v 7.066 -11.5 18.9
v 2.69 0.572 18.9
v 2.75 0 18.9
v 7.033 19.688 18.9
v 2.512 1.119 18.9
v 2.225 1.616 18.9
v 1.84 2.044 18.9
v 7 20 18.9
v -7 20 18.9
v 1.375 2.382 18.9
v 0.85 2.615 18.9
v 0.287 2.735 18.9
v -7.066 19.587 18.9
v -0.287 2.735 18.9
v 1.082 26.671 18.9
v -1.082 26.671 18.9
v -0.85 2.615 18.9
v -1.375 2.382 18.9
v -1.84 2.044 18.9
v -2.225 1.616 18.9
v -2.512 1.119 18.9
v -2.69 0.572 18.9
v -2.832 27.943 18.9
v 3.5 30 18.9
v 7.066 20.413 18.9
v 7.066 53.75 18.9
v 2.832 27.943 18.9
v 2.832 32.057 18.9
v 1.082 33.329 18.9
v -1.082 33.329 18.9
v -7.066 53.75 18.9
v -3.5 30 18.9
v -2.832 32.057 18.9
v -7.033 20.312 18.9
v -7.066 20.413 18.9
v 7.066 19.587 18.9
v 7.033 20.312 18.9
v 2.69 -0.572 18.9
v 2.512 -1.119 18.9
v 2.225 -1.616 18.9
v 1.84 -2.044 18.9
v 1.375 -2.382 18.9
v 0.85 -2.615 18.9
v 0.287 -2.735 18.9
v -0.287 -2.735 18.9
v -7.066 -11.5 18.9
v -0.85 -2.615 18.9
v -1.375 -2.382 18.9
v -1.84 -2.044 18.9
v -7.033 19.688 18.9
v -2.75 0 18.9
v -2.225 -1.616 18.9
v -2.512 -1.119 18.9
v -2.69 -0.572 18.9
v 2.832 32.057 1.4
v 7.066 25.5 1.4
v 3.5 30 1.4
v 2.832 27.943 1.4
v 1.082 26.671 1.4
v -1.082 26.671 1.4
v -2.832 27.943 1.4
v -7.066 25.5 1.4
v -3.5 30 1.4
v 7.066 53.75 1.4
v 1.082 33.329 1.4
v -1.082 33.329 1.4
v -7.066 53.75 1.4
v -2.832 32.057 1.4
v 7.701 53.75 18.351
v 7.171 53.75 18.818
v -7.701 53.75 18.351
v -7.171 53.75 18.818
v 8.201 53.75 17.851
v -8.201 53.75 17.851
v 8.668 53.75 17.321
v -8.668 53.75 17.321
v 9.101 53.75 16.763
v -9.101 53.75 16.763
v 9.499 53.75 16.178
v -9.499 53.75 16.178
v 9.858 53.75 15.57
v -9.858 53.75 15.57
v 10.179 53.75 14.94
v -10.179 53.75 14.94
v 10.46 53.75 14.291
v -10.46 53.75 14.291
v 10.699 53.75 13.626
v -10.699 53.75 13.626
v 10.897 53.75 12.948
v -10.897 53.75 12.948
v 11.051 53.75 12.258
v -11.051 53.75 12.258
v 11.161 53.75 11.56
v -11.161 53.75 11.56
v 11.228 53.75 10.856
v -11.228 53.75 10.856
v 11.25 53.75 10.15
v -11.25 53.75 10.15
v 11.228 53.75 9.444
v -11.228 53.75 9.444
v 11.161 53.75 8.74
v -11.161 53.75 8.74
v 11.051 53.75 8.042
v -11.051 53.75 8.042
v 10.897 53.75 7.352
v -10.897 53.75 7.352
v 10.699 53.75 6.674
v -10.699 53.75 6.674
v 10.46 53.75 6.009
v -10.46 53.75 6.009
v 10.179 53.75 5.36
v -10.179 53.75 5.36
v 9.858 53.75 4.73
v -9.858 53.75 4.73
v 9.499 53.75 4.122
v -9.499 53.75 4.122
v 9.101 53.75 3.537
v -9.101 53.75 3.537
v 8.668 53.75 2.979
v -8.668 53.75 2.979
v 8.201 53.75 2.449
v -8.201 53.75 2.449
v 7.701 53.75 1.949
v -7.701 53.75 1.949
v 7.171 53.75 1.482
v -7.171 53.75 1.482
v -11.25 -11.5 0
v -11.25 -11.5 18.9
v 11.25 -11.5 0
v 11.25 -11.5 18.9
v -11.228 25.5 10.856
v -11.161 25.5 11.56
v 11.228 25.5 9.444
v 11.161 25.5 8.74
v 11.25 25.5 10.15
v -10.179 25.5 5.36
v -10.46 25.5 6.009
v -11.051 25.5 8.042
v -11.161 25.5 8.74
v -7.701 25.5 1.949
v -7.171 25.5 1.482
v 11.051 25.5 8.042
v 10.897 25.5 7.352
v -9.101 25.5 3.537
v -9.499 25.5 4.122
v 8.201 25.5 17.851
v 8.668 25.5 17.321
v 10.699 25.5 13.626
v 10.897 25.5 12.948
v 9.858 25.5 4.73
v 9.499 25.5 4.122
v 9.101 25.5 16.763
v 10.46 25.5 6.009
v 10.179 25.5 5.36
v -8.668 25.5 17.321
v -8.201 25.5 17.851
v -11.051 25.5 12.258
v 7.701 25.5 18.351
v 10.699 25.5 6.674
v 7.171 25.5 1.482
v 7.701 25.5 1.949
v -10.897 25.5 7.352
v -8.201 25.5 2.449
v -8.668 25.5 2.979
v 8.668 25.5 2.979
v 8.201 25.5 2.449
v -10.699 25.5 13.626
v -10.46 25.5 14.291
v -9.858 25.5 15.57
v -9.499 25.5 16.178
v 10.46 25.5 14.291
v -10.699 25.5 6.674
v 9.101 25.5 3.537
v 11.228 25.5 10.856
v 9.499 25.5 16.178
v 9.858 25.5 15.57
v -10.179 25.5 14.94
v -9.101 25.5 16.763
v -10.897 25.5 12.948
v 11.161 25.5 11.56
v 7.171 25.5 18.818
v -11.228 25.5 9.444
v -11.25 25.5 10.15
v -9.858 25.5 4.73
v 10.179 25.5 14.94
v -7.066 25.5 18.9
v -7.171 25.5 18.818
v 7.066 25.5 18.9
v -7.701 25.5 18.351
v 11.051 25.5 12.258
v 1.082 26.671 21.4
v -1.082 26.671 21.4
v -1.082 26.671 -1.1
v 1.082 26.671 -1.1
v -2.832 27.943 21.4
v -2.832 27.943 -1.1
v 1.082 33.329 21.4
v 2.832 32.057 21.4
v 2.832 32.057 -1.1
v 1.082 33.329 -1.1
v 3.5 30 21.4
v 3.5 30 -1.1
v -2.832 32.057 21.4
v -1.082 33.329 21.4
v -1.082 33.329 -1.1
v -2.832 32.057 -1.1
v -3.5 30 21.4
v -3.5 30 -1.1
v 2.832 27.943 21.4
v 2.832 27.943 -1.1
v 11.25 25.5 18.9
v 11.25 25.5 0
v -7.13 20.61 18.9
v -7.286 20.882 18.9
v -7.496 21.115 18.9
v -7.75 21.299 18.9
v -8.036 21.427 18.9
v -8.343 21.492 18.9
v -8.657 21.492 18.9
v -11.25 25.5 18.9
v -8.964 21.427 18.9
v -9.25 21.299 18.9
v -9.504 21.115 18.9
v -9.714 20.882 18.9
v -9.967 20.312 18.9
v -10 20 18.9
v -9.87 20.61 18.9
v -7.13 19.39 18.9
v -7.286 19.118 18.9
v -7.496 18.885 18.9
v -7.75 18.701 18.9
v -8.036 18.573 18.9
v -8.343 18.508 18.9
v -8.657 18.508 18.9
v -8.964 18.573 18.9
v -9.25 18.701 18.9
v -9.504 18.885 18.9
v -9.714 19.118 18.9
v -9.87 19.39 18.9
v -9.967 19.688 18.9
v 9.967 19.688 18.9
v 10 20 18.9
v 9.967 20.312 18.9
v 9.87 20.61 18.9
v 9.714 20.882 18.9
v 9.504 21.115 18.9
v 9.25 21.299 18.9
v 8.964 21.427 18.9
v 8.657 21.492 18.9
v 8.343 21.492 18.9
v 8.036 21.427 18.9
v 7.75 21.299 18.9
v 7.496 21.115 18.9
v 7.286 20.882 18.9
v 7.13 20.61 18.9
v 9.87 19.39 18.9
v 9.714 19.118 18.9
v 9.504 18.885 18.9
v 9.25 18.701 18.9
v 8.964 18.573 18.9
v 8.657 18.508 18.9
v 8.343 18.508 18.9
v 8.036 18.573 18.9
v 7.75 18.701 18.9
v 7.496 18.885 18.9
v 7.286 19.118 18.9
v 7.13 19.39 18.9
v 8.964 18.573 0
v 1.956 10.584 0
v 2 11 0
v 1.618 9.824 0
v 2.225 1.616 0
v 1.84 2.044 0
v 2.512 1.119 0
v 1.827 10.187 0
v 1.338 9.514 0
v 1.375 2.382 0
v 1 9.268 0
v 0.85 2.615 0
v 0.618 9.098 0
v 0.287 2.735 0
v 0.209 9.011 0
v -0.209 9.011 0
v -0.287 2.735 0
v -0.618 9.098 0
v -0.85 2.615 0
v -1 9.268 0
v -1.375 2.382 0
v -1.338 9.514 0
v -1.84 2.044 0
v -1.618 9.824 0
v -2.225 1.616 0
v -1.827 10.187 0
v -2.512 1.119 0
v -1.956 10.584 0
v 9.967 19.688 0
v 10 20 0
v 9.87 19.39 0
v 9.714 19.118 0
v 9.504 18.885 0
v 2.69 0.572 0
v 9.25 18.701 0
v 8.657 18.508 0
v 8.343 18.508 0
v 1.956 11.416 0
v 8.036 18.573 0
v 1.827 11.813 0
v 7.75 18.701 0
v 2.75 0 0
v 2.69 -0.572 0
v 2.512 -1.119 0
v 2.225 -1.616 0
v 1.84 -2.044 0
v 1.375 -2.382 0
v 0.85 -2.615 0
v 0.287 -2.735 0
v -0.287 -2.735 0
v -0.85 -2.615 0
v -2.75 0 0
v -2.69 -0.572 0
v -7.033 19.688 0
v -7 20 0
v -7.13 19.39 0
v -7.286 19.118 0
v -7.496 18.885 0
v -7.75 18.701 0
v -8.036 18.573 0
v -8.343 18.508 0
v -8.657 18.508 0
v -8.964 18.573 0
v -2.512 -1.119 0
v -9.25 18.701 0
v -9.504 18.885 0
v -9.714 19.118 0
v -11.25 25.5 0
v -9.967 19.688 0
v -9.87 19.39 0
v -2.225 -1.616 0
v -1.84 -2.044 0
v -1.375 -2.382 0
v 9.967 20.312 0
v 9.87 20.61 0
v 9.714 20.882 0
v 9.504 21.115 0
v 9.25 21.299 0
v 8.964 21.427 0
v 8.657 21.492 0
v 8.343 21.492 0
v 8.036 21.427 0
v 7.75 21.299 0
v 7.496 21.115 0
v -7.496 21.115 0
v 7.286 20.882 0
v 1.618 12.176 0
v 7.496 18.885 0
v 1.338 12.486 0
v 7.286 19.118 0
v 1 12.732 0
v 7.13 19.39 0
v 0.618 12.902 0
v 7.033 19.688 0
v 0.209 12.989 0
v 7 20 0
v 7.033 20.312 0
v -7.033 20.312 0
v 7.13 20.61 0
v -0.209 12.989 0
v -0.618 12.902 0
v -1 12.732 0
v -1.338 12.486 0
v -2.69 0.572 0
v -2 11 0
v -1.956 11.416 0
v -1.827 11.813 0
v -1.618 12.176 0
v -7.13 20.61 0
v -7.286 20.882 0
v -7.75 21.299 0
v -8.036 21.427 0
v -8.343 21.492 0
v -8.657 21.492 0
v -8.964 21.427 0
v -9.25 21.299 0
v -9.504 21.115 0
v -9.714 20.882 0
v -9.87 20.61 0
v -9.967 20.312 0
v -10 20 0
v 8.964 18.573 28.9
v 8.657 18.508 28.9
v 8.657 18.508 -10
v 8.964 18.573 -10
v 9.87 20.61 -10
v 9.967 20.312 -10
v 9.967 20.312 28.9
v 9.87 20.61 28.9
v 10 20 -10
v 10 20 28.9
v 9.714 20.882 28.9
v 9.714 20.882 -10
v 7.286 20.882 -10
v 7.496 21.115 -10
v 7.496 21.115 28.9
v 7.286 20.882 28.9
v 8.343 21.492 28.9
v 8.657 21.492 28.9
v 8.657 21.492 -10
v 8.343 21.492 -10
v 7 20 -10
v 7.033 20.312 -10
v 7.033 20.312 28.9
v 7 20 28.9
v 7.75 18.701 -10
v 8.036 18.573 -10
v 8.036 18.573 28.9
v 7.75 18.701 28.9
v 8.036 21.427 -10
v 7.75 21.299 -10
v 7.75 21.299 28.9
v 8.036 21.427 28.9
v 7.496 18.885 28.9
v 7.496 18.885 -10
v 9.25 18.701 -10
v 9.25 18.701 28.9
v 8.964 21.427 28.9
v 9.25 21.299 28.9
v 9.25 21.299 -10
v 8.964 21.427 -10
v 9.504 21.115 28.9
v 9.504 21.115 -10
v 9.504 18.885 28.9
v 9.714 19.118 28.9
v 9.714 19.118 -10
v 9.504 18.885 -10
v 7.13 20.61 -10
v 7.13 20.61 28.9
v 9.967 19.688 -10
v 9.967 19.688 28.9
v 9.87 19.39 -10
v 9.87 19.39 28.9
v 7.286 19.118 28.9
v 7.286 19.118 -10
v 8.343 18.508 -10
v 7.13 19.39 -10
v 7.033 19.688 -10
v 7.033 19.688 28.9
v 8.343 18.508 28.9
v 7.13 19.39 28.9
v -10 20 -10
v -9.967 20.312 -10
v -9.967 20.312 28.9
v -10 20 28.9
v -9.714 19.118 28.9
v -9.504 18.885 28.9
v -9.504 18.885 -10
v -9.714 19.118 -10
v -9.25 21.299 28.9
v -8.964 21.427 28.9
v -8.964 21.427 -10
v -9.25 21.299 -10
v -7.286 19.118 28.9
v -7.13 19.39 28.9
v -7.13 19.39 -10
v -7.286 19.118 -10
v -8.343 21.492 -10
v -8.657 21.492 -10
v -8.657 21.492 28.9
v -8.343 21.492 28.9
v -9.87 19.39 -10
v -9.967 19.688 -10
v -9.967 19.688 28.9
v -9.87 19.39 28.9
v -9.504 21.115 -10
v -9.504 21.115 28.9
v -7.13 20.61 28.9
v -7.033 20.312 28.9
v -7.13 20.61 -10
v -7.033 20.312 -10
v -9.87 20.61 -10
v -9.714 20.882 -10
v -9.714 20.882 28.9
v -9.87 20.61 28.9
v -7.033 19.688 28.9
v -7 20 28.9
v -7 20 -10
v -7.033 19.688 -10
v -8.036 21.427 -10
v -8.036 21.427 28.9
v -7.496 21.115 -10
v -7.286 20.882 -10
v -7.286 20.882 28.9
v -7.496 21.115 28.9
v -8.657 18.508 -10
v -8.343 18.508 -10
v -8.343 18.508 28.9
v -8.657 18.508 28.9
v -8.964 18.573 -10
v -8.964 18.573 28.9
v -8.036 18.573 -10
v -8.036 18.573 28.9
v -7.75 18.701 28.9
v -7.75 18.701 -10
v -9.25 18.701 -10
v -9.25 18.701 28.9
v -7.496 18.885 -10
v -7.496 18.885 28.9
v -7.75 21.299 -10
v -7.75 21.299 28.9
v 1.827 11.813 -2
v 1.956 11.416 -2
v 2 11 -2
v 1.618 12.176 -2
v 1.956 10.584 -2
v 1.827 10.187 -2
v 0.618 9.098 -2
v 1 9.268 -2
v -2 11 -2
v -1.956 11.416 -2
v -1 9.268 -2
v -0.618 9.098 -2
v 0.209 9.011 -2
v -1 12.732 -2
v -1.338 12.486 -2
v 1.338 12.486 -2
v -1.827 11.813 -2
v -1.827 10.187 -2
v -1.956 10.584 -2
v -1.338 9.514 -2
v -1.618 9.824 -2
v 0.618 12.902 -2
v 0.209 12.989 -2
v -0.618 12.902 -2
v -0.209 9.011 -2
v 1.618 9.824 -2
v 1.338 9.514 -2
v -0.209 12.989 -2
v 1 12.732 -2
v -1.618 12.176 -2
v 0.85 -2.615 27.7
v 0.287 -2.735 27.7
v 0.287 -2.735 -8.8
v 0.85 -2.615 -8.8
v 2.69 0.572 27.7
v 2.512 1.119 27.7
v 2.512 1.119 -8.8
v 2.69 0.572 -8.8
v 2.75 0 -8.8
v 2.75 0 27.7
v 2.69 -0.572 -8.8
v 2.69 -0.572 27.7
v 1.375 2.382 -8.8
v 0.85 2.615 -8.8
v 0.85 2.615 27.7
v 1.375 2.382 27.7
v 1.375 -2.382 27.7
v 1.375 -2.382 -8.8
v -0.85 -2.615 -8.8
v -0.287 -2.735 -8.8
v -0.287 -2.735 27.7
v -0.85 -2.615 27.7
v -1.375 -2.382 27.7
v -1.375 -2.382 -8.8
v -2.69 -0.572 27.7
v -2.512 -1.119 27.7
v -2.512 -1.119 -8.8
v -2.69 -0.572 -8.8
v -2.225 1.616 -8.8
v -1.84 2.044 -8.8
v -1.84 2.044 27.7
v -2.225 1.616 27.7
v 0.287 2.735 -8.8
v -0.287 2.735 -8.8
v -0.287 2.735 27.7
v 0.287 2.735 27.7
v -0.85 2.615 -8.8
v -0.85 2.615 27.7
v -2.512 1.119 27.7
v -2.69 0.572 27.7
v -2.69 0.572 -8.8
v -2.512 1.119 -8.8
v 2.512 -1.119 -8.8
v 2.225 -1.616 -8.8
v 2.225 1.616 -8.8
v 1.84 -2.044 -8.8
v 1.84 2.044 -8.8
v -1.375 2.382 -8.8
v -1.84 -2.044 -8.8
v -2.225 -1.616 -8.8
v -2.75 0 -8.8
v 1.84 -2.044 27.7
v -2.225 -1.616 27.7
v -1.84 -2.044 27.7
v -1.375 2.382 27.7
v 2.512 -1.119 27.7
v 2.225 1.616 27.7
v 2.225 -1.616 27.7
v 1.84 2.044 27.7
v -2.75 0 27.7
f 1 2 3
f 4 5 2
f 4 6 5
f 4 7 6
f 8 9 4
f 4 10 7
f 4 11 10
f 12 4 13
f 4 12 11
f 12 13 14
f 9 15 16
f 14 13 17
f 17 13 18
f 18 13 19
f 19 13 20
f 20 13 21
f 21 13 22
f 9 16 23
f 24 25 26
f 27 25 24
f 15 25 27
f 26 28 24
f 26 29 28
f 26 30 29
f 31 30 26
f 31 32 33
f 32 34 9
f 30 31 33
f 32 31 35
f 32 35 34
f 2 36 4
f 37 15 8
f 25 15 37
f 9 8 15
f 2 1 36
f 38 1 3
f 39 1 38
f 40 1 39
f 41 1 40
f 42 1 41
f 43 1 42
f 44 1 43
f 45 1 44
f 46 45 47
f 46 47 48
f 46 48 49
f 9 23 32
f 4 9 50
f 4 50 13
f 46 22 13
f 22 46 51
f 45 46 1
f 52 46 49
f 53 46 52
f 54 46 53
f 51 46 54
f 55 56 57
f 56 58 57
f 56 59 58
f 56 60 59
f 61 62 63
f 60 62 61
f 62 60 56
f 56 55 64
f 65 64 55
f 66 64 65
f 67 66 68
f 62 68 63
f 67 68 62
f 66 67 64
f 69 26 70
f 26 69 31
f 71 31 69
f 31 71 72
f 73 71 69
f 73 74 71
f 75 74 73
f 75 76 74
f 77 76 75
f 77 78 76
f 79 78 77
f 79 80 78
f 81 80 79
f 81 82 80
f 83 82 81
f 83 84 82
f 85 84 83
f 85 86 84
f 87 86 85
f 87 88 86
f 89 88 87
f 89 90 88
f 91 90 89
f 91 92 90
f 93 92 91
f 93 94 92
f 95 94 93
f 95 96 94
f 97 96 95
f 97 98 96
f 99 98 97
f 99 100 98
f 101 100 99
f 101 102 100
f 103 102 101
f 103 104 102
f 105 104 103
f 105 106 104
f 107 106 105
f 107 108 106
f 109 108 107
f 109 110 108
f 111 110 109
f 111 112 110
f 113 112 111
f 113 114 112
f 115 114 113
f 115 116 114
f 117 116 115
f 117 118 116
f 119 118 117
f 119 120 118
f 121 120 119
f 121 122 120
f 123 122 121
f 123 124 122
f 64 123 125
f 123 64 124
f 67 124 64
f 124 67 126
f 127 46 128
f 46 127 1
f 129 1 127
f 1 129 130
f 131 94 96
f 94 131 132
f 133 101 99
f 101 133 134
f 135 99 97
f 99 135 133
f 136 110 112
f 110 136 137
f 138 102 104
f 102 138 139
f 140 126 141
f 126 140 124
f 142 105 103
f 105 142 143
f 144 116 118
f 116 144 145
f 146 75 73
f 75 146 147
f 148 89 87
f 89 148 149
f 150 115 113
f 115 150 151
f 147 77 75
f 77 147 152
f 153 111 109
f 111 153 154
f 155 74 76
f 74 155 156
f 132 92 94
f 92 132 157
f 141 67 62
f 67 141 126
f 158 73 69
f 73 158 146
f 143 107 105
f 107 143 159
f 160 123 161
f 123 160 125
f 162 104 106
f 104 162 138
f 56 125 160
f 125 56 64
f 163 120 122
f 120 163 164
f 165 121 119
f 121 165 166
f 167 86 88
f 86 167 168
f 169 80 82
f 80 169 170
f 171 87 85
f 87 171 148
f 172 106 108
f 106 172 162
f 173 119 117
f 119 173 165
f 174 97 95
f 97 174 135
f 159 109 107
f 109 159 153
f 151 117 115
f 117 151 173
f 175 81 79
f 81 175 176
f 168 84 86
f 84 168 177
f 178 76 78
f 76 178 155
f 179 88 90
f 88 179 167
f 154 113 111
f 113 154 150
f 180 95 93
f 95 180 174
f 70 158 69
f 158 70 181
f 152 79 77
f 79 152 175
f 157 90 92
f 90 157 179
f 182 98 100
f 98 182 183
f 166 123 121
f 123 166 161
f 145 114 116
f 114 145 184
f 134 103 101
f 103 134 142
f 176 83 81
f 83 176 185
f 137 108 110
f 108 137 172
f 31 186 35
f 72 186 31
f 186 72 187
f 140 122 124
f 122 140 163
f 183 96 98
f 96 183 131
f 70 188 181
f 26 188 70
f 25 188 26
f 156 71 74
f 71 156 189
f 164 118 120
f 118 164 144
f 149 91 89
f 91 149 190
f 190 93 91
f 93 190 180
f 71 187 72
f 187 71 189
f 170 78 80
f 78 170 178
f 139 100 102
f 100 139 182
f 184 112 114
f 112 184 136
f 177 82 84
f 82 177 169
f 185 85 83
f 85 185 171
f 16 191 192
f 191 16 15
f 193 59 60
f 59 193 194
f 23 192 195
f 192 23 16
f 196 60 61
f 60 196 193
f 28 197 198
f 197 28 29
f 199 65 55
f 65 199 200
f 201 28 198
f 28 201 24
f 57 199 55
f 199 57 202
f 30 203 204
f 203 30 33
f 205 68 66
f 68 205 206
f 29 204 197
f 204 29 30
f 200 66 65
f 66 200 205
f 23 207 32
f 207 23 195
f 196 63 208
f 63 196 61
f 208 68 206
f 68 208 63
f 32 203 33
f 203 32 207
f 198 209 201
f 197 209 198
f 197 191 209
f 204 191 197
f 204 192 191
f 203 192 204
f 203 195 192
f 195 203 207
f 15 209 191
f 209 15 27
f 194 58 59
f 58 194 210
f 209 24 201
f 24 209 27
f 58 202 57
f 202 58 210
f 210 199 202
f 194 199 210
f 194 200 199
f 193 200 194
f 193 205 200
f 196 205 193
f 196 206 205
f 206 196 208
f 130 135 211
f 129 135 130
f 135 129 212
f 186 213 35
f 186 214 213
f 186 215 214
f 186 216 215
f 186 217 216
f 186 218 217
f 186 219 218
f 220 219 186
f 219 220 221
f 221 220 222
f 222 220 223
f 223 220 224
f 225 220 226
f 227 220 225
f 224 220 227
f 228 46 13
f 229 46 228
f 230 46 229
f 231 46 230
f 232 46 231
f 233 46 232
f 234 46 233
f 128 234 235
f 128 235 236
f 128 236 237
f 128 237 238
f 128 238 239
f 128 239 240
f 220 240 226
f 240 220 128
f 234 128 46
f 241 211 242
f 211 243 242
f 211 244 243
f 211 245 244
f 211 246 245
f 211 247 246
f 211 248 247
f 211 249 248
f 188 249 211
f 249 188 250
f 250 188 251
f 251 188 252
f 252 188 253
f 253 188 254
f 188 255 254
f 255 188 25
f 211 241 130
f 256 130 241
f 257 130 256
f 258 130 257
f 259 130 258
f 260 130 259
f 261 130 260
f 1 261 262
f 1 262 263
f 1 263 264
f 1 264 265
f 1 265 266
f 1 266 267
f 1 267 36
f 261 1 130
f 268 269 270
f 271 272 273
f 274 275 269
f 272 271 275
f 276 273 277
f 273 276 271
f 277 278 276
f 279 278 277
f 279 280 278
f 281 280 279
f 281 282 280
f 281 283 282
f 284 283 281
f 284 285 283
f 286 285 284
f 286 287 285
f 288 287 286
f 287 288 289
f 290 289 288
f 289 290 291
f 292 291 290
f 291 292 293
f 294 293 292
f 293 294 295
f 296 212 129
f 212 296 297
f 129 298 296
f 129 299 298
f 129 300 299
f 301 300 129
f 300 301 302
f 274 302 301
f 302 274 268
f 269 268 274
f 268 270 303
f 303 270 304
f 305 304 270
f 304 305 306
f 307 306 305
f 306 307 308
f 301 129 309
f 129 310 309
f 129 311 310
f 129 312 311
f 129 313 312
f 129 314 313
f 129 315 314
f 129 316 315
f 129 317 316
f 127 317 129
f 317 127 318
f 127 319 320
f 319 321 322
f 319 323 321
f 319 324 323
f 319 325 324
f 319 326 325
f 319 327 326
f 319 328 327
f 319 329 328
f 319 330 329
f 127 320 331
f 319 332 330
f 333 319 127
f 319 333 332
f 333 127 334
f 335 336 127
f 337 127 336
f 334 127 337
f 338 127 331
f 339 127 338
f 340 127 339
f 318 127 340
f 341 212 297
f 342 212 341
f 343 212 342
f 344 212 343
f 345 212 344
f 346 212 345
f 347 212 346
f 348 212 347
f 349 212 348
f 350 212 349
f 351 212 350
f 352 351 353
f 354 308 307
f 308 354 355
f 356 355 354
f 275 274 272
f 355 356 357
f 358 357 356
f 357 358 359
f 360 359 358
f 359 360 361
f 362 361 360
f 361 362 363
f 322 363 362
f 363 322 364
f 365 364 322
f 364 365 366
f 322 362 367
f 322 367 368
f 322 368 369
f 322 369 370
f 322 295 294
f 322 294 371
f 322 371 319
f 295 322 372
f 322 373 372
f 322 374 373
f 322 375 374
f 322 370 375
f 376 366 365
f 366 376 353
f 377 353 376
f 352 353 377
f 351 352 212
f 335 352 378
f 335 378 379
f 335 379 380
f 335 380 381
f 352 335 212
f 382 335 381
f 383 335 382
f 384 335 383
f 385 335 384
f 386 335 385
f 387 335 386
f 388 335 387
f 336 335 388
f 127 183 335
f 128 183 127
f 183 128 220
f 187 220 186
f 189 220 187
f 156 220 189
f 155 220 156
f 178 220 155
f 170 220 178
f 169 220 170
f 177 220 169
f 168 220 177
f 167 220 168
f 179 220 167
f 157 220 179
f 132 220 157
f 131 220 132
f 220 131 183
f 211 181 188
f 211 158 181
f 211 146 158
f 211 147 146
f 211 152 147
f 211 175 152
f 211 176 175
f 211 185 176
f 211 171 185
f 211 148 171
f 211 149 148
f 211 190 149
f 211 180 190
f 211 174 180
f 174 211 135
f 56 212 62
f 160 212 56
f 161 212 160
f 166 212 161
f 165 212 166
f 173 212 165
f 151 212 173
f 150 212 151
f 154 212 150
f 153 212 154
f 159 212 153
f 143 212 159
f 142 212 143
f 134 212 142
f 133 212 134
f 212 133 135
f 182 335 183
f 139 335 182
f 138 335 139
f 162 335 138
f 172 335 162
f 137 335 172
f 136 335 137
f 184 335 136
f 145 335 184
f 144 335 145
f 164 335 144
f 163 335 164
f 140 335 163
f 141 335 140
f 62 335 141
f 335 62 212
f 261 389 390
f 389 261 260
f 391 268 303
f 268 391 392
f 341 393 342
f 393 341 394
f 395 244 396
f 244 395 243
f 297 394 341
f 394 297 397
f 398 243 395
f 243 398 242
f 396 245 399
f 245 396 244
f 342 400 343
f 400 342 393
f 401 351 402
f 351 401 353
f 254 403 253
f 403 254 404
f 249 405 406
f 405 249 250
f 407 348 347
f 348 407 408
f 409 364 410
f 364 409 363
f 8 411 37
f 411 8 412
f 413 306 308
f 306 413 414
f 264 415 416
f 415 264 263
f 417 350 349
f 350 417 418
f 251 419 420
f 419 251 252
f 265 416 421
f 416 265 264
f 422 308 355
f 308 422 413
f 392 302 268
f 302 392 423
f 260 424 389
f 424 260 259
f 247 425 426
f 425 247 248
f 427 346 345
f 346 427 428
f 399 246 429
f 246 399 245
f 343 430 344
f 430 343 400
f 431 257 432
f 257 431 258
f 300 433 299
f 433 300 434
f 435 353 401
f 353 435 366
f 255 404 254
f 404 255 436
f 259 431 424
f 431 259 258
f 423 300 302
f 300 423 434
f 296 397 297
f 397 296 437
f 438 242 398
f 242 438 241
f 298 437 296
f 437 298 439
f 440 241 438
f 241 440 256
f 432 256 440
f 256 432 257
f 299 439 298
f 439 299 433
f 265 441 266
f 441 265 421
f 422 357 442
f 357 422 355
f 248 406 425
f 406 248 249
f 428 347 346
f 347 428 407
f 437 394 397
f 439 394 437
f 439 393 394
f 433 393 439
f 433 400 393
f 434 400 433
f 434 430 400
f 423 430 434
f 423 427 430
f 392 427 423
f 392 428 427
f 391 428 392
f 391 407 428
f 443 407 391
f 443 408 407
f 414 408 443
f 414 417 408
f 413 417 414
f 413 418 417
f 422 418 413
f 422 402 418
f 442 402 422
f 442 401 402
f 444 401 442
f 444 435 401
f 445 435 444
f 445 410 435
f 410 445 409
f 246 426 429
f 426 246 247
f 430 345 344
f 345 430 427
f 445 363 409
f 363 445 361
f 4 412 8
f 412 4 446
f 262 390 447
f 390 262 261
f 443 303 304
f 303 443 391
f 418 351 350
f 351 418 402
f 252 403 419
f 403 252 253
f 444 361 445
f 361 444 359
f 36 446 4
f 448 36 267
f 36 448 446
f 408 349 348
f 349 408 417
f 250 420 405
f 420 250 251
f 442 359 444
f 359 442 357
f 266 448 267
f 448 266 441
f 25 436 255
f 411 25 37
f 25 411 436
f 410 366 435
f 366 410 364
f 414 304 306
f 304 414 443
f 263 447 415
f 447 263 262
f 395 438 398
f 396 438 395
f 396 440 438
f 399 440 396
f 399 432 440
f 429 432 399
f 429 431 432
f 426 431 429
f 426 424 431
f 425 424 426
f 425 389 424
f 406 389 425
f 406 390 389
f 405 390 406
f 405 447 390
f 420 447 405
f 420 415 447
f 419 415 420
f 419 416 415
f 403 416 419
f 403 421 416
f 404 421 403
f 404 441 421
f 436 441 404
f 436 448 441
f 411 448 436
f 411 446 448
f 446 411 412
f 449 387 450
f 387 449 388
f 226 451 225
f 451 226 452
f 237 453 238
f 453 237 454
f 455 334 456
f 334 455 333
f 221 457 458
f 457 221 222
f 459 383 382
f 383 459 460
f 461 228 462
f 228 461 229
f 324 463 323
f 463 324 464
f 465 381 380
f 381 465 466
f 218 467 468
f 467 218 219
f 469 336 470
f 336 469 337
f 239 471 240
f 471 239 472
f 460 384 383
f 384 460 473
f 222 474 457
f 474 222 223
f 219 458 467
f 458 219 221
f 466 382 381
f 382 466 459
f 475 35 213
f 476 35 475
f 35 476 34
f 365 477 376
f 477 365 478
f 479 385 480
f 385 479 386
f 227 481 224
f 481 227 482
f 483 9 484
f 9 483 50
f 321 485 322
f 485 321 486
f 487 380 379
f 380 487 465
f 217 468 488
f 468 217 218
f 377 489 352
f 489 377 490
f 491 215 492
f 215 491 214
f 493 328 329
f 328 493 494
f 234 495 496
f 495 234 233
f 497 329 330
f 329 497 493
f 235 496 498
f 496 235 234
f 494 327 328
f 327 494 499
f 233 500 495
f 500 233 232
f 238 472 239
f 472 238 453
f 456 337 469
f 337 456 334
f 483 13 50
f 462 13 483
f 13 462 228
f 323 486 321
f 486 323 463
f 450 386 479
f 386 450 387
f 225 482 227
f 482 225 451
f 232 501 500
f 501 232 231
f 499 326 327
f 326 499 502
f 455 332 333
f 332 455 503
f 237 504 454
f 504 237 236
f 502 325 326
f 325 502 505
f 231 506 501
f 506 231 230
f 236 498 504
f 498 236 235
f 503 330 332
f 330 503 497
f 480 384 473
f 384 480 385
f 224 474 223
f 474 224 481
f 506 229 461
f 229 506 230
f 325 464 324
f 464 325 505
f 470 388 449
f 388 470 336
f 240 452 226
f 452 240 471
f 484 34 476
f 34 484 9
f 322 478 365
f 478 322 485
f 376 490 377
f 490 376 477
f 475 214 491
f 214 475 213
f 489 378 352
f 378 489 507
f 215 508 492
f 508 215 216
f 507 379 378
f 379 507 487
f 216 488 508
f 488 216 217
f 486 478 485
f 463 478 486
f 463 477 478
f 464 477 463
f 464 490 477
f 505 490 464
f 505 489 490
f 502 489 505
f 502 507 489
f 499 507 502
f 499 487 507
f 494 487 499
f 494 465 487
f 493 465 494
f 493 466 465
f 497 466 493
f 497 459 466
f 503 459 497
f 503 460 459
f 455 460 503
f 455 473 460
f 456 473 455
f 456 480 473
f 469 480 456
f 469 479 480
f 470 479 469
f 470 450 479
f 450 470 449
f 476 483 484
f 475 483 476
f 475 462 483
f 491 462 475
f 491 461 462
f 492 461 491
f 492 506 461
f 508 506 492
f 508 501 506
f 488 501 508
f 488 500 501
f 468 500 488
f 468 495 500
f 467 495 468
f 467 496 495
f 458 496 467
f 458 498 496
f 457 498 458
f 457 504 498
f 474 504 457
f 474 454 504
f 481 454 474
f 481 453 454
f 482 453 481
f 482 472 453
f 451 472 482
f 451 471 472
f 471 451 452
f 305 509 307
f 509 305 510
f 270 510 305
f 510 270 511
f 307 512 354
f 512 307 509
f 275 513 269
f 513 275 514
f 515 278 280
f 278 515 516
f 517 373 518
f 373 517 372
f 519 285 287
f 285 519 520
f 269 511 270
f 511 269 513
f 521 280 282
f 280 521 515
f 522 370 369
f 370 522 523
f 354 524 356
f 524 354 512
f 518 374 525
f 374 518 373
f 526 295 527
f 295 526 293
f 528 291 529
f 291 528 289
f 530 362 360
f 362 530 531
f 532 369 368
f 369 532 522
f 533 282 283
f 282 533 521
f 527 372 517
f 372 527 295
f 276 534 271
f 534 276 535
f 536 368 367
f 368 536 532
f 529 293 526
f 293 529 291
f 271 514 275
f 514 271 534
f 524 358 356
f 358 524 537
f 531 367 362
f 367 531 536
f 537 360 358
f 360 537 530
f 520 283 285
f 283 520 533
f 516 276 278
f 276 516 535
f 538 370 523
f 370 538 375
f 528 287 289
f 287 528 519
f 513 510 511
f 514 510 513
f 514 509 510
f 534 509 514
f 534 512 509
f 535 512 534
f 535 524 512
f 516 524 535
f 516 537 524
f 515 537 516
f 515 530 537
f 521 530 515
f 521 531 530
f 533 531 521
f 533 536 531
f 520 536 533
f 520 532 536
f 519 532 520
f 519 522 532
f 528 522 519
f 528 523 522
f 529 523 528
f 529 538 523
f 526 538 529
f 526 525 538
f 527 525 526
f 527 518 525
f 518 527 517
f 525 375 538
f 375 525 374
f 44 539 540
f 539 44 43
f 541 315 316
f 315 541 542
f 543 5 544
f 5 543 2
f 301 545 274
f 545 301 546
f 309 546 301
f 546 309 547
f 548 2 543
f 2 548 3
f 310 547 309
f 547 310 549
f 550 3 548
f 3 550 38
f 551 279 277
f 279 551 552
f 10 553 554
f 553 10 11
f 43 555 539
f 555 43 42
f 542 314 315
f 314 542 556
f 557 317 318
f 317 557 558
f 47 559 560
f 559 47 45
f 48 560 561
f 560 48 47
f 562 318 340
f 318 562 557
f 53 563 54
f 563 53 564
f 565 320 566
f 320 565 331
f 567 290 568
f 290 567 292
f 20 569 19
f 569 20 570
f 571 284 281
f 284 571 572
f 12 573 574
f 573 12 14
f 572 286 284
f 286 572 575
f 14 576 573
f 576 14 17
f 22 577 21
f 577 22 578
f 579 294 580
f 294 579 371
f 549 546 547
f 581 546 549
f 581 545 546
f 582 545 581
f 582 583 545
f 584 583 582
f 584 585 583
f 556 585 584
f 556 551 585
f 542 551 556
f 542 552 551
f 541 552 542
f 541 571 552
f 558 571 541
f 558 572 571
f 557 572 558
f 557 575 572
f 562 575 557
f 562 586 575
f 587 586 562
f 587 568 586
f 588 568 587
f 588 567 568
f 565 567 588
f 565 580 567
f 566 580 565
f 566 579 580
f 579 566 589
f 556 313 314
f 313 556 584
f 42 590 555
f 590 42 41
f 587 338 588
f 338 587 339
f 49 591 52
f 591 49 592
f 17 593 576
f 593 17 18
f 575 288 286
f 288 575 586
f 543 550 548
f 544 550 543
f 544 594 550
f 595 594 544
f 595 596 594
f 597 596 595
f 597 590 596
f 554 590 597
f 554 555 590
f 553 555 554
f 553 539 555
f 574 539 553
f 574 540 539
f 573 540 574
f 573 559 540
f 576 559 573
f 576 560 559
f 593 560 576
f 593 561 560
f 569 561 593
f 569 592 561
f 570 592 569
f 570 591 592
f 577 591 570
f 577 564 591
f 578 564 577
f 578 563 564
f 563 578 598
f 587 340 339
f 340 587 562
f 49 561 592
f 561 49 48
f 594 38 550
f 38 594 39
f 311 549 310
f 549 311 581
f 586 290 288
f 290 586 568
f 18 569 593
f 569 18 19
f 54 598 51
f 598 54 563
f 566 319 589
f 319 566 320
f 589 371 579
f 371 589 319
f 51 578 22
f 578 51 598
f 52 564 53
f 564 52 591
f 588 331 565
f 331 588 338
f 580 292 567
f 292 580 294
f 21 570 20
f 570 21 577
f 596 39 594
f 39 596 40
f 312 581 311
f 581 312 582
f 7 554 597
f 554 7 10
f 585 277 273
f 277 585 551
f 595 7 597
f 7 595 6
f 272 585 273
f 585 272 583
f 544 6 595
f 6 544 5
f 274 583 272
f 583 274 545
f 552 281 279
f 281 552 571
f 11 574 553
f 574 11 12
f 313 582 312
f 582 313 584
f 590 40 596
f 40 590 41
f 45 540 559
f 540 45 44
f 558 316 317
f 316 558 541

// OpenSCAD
module yellow_motor(screw_protrusion = 10) {
    motor_width = 18.9;
    motor_depth = 22.5;
    shaft_radius = 5.5 / 2;
    shaft_length = 36.5;
    shaft_protrusion_radius = 7 / 2;
    shaft_to_knob = 11;
    knob_radius = 4 / 2;
    knob_height = 2;
    shaft_to_screw_holes = [8.5, 20];
    screw_hole_radius = 3 / 2;
    shaft_to_clip = 30;
    clip_radius = 7 / 2;
    clip_height = 1;
    across_clips = 22.5;
    shaft_to_back_edge = 11.5;
    shaft_to_front_edge = 25.5;
    round_body_flats = 17.5;
    round_body_radius = 22.5/2;
    total_body_length = 65.25;
    
    // motor body
    translate([0, -shaft_to_back_edge, 0]) {
        // body bit
        translate([-motor_depth / 2, 0, 0]) cube([motor_depth, shaft_to_back_edge + shaft_to_front_edge, motor_width]);
        // round bit and clips
        translate([0, 0, motor_width - round_body_flats]) {
            // clips
            translate([0, shaft_to_back_edge + shaft_to_clip, -1 * (across_clips - round_body_flats) / 2]) cylinder(r = clip_radius, h = across_clips, $fn = 10);
            // round body
            intersection() {
                translate([-round_body_radius, 0, 0]) cube([round_body_radius*2, total_body_length, round_body_flats]);
                translate([0, 0, round_body_flats / 2])
                    rotate([270, 0, 0])
                        cylinder(r = round_body_radius, h = total_body_length, $fn = 100);
            }
        }
    }
    // knob
    translate([0, shaft_to_knob, -knob_height]) cylinder(r = knob_radius, h = knob_height, $fn = 30);
    
    // motor shaft
    translate([0, 0, motor_width / 2]) cylinder(r = shaft_radius, h = shaft_length, center = true, $fn = 30);
    
    // screw holes
    for(m = [0,1]) {
        mirror([m, 0, 0]) translate([shaft_to_screw_holes[0], shaft_to_screw_holes[1], -screw_protrusion]) cylinder(r = screw_hole_radius, h = screw_protrusion * 2 + motor_width, $fn = 30);
    }
}

yellow_motor();
